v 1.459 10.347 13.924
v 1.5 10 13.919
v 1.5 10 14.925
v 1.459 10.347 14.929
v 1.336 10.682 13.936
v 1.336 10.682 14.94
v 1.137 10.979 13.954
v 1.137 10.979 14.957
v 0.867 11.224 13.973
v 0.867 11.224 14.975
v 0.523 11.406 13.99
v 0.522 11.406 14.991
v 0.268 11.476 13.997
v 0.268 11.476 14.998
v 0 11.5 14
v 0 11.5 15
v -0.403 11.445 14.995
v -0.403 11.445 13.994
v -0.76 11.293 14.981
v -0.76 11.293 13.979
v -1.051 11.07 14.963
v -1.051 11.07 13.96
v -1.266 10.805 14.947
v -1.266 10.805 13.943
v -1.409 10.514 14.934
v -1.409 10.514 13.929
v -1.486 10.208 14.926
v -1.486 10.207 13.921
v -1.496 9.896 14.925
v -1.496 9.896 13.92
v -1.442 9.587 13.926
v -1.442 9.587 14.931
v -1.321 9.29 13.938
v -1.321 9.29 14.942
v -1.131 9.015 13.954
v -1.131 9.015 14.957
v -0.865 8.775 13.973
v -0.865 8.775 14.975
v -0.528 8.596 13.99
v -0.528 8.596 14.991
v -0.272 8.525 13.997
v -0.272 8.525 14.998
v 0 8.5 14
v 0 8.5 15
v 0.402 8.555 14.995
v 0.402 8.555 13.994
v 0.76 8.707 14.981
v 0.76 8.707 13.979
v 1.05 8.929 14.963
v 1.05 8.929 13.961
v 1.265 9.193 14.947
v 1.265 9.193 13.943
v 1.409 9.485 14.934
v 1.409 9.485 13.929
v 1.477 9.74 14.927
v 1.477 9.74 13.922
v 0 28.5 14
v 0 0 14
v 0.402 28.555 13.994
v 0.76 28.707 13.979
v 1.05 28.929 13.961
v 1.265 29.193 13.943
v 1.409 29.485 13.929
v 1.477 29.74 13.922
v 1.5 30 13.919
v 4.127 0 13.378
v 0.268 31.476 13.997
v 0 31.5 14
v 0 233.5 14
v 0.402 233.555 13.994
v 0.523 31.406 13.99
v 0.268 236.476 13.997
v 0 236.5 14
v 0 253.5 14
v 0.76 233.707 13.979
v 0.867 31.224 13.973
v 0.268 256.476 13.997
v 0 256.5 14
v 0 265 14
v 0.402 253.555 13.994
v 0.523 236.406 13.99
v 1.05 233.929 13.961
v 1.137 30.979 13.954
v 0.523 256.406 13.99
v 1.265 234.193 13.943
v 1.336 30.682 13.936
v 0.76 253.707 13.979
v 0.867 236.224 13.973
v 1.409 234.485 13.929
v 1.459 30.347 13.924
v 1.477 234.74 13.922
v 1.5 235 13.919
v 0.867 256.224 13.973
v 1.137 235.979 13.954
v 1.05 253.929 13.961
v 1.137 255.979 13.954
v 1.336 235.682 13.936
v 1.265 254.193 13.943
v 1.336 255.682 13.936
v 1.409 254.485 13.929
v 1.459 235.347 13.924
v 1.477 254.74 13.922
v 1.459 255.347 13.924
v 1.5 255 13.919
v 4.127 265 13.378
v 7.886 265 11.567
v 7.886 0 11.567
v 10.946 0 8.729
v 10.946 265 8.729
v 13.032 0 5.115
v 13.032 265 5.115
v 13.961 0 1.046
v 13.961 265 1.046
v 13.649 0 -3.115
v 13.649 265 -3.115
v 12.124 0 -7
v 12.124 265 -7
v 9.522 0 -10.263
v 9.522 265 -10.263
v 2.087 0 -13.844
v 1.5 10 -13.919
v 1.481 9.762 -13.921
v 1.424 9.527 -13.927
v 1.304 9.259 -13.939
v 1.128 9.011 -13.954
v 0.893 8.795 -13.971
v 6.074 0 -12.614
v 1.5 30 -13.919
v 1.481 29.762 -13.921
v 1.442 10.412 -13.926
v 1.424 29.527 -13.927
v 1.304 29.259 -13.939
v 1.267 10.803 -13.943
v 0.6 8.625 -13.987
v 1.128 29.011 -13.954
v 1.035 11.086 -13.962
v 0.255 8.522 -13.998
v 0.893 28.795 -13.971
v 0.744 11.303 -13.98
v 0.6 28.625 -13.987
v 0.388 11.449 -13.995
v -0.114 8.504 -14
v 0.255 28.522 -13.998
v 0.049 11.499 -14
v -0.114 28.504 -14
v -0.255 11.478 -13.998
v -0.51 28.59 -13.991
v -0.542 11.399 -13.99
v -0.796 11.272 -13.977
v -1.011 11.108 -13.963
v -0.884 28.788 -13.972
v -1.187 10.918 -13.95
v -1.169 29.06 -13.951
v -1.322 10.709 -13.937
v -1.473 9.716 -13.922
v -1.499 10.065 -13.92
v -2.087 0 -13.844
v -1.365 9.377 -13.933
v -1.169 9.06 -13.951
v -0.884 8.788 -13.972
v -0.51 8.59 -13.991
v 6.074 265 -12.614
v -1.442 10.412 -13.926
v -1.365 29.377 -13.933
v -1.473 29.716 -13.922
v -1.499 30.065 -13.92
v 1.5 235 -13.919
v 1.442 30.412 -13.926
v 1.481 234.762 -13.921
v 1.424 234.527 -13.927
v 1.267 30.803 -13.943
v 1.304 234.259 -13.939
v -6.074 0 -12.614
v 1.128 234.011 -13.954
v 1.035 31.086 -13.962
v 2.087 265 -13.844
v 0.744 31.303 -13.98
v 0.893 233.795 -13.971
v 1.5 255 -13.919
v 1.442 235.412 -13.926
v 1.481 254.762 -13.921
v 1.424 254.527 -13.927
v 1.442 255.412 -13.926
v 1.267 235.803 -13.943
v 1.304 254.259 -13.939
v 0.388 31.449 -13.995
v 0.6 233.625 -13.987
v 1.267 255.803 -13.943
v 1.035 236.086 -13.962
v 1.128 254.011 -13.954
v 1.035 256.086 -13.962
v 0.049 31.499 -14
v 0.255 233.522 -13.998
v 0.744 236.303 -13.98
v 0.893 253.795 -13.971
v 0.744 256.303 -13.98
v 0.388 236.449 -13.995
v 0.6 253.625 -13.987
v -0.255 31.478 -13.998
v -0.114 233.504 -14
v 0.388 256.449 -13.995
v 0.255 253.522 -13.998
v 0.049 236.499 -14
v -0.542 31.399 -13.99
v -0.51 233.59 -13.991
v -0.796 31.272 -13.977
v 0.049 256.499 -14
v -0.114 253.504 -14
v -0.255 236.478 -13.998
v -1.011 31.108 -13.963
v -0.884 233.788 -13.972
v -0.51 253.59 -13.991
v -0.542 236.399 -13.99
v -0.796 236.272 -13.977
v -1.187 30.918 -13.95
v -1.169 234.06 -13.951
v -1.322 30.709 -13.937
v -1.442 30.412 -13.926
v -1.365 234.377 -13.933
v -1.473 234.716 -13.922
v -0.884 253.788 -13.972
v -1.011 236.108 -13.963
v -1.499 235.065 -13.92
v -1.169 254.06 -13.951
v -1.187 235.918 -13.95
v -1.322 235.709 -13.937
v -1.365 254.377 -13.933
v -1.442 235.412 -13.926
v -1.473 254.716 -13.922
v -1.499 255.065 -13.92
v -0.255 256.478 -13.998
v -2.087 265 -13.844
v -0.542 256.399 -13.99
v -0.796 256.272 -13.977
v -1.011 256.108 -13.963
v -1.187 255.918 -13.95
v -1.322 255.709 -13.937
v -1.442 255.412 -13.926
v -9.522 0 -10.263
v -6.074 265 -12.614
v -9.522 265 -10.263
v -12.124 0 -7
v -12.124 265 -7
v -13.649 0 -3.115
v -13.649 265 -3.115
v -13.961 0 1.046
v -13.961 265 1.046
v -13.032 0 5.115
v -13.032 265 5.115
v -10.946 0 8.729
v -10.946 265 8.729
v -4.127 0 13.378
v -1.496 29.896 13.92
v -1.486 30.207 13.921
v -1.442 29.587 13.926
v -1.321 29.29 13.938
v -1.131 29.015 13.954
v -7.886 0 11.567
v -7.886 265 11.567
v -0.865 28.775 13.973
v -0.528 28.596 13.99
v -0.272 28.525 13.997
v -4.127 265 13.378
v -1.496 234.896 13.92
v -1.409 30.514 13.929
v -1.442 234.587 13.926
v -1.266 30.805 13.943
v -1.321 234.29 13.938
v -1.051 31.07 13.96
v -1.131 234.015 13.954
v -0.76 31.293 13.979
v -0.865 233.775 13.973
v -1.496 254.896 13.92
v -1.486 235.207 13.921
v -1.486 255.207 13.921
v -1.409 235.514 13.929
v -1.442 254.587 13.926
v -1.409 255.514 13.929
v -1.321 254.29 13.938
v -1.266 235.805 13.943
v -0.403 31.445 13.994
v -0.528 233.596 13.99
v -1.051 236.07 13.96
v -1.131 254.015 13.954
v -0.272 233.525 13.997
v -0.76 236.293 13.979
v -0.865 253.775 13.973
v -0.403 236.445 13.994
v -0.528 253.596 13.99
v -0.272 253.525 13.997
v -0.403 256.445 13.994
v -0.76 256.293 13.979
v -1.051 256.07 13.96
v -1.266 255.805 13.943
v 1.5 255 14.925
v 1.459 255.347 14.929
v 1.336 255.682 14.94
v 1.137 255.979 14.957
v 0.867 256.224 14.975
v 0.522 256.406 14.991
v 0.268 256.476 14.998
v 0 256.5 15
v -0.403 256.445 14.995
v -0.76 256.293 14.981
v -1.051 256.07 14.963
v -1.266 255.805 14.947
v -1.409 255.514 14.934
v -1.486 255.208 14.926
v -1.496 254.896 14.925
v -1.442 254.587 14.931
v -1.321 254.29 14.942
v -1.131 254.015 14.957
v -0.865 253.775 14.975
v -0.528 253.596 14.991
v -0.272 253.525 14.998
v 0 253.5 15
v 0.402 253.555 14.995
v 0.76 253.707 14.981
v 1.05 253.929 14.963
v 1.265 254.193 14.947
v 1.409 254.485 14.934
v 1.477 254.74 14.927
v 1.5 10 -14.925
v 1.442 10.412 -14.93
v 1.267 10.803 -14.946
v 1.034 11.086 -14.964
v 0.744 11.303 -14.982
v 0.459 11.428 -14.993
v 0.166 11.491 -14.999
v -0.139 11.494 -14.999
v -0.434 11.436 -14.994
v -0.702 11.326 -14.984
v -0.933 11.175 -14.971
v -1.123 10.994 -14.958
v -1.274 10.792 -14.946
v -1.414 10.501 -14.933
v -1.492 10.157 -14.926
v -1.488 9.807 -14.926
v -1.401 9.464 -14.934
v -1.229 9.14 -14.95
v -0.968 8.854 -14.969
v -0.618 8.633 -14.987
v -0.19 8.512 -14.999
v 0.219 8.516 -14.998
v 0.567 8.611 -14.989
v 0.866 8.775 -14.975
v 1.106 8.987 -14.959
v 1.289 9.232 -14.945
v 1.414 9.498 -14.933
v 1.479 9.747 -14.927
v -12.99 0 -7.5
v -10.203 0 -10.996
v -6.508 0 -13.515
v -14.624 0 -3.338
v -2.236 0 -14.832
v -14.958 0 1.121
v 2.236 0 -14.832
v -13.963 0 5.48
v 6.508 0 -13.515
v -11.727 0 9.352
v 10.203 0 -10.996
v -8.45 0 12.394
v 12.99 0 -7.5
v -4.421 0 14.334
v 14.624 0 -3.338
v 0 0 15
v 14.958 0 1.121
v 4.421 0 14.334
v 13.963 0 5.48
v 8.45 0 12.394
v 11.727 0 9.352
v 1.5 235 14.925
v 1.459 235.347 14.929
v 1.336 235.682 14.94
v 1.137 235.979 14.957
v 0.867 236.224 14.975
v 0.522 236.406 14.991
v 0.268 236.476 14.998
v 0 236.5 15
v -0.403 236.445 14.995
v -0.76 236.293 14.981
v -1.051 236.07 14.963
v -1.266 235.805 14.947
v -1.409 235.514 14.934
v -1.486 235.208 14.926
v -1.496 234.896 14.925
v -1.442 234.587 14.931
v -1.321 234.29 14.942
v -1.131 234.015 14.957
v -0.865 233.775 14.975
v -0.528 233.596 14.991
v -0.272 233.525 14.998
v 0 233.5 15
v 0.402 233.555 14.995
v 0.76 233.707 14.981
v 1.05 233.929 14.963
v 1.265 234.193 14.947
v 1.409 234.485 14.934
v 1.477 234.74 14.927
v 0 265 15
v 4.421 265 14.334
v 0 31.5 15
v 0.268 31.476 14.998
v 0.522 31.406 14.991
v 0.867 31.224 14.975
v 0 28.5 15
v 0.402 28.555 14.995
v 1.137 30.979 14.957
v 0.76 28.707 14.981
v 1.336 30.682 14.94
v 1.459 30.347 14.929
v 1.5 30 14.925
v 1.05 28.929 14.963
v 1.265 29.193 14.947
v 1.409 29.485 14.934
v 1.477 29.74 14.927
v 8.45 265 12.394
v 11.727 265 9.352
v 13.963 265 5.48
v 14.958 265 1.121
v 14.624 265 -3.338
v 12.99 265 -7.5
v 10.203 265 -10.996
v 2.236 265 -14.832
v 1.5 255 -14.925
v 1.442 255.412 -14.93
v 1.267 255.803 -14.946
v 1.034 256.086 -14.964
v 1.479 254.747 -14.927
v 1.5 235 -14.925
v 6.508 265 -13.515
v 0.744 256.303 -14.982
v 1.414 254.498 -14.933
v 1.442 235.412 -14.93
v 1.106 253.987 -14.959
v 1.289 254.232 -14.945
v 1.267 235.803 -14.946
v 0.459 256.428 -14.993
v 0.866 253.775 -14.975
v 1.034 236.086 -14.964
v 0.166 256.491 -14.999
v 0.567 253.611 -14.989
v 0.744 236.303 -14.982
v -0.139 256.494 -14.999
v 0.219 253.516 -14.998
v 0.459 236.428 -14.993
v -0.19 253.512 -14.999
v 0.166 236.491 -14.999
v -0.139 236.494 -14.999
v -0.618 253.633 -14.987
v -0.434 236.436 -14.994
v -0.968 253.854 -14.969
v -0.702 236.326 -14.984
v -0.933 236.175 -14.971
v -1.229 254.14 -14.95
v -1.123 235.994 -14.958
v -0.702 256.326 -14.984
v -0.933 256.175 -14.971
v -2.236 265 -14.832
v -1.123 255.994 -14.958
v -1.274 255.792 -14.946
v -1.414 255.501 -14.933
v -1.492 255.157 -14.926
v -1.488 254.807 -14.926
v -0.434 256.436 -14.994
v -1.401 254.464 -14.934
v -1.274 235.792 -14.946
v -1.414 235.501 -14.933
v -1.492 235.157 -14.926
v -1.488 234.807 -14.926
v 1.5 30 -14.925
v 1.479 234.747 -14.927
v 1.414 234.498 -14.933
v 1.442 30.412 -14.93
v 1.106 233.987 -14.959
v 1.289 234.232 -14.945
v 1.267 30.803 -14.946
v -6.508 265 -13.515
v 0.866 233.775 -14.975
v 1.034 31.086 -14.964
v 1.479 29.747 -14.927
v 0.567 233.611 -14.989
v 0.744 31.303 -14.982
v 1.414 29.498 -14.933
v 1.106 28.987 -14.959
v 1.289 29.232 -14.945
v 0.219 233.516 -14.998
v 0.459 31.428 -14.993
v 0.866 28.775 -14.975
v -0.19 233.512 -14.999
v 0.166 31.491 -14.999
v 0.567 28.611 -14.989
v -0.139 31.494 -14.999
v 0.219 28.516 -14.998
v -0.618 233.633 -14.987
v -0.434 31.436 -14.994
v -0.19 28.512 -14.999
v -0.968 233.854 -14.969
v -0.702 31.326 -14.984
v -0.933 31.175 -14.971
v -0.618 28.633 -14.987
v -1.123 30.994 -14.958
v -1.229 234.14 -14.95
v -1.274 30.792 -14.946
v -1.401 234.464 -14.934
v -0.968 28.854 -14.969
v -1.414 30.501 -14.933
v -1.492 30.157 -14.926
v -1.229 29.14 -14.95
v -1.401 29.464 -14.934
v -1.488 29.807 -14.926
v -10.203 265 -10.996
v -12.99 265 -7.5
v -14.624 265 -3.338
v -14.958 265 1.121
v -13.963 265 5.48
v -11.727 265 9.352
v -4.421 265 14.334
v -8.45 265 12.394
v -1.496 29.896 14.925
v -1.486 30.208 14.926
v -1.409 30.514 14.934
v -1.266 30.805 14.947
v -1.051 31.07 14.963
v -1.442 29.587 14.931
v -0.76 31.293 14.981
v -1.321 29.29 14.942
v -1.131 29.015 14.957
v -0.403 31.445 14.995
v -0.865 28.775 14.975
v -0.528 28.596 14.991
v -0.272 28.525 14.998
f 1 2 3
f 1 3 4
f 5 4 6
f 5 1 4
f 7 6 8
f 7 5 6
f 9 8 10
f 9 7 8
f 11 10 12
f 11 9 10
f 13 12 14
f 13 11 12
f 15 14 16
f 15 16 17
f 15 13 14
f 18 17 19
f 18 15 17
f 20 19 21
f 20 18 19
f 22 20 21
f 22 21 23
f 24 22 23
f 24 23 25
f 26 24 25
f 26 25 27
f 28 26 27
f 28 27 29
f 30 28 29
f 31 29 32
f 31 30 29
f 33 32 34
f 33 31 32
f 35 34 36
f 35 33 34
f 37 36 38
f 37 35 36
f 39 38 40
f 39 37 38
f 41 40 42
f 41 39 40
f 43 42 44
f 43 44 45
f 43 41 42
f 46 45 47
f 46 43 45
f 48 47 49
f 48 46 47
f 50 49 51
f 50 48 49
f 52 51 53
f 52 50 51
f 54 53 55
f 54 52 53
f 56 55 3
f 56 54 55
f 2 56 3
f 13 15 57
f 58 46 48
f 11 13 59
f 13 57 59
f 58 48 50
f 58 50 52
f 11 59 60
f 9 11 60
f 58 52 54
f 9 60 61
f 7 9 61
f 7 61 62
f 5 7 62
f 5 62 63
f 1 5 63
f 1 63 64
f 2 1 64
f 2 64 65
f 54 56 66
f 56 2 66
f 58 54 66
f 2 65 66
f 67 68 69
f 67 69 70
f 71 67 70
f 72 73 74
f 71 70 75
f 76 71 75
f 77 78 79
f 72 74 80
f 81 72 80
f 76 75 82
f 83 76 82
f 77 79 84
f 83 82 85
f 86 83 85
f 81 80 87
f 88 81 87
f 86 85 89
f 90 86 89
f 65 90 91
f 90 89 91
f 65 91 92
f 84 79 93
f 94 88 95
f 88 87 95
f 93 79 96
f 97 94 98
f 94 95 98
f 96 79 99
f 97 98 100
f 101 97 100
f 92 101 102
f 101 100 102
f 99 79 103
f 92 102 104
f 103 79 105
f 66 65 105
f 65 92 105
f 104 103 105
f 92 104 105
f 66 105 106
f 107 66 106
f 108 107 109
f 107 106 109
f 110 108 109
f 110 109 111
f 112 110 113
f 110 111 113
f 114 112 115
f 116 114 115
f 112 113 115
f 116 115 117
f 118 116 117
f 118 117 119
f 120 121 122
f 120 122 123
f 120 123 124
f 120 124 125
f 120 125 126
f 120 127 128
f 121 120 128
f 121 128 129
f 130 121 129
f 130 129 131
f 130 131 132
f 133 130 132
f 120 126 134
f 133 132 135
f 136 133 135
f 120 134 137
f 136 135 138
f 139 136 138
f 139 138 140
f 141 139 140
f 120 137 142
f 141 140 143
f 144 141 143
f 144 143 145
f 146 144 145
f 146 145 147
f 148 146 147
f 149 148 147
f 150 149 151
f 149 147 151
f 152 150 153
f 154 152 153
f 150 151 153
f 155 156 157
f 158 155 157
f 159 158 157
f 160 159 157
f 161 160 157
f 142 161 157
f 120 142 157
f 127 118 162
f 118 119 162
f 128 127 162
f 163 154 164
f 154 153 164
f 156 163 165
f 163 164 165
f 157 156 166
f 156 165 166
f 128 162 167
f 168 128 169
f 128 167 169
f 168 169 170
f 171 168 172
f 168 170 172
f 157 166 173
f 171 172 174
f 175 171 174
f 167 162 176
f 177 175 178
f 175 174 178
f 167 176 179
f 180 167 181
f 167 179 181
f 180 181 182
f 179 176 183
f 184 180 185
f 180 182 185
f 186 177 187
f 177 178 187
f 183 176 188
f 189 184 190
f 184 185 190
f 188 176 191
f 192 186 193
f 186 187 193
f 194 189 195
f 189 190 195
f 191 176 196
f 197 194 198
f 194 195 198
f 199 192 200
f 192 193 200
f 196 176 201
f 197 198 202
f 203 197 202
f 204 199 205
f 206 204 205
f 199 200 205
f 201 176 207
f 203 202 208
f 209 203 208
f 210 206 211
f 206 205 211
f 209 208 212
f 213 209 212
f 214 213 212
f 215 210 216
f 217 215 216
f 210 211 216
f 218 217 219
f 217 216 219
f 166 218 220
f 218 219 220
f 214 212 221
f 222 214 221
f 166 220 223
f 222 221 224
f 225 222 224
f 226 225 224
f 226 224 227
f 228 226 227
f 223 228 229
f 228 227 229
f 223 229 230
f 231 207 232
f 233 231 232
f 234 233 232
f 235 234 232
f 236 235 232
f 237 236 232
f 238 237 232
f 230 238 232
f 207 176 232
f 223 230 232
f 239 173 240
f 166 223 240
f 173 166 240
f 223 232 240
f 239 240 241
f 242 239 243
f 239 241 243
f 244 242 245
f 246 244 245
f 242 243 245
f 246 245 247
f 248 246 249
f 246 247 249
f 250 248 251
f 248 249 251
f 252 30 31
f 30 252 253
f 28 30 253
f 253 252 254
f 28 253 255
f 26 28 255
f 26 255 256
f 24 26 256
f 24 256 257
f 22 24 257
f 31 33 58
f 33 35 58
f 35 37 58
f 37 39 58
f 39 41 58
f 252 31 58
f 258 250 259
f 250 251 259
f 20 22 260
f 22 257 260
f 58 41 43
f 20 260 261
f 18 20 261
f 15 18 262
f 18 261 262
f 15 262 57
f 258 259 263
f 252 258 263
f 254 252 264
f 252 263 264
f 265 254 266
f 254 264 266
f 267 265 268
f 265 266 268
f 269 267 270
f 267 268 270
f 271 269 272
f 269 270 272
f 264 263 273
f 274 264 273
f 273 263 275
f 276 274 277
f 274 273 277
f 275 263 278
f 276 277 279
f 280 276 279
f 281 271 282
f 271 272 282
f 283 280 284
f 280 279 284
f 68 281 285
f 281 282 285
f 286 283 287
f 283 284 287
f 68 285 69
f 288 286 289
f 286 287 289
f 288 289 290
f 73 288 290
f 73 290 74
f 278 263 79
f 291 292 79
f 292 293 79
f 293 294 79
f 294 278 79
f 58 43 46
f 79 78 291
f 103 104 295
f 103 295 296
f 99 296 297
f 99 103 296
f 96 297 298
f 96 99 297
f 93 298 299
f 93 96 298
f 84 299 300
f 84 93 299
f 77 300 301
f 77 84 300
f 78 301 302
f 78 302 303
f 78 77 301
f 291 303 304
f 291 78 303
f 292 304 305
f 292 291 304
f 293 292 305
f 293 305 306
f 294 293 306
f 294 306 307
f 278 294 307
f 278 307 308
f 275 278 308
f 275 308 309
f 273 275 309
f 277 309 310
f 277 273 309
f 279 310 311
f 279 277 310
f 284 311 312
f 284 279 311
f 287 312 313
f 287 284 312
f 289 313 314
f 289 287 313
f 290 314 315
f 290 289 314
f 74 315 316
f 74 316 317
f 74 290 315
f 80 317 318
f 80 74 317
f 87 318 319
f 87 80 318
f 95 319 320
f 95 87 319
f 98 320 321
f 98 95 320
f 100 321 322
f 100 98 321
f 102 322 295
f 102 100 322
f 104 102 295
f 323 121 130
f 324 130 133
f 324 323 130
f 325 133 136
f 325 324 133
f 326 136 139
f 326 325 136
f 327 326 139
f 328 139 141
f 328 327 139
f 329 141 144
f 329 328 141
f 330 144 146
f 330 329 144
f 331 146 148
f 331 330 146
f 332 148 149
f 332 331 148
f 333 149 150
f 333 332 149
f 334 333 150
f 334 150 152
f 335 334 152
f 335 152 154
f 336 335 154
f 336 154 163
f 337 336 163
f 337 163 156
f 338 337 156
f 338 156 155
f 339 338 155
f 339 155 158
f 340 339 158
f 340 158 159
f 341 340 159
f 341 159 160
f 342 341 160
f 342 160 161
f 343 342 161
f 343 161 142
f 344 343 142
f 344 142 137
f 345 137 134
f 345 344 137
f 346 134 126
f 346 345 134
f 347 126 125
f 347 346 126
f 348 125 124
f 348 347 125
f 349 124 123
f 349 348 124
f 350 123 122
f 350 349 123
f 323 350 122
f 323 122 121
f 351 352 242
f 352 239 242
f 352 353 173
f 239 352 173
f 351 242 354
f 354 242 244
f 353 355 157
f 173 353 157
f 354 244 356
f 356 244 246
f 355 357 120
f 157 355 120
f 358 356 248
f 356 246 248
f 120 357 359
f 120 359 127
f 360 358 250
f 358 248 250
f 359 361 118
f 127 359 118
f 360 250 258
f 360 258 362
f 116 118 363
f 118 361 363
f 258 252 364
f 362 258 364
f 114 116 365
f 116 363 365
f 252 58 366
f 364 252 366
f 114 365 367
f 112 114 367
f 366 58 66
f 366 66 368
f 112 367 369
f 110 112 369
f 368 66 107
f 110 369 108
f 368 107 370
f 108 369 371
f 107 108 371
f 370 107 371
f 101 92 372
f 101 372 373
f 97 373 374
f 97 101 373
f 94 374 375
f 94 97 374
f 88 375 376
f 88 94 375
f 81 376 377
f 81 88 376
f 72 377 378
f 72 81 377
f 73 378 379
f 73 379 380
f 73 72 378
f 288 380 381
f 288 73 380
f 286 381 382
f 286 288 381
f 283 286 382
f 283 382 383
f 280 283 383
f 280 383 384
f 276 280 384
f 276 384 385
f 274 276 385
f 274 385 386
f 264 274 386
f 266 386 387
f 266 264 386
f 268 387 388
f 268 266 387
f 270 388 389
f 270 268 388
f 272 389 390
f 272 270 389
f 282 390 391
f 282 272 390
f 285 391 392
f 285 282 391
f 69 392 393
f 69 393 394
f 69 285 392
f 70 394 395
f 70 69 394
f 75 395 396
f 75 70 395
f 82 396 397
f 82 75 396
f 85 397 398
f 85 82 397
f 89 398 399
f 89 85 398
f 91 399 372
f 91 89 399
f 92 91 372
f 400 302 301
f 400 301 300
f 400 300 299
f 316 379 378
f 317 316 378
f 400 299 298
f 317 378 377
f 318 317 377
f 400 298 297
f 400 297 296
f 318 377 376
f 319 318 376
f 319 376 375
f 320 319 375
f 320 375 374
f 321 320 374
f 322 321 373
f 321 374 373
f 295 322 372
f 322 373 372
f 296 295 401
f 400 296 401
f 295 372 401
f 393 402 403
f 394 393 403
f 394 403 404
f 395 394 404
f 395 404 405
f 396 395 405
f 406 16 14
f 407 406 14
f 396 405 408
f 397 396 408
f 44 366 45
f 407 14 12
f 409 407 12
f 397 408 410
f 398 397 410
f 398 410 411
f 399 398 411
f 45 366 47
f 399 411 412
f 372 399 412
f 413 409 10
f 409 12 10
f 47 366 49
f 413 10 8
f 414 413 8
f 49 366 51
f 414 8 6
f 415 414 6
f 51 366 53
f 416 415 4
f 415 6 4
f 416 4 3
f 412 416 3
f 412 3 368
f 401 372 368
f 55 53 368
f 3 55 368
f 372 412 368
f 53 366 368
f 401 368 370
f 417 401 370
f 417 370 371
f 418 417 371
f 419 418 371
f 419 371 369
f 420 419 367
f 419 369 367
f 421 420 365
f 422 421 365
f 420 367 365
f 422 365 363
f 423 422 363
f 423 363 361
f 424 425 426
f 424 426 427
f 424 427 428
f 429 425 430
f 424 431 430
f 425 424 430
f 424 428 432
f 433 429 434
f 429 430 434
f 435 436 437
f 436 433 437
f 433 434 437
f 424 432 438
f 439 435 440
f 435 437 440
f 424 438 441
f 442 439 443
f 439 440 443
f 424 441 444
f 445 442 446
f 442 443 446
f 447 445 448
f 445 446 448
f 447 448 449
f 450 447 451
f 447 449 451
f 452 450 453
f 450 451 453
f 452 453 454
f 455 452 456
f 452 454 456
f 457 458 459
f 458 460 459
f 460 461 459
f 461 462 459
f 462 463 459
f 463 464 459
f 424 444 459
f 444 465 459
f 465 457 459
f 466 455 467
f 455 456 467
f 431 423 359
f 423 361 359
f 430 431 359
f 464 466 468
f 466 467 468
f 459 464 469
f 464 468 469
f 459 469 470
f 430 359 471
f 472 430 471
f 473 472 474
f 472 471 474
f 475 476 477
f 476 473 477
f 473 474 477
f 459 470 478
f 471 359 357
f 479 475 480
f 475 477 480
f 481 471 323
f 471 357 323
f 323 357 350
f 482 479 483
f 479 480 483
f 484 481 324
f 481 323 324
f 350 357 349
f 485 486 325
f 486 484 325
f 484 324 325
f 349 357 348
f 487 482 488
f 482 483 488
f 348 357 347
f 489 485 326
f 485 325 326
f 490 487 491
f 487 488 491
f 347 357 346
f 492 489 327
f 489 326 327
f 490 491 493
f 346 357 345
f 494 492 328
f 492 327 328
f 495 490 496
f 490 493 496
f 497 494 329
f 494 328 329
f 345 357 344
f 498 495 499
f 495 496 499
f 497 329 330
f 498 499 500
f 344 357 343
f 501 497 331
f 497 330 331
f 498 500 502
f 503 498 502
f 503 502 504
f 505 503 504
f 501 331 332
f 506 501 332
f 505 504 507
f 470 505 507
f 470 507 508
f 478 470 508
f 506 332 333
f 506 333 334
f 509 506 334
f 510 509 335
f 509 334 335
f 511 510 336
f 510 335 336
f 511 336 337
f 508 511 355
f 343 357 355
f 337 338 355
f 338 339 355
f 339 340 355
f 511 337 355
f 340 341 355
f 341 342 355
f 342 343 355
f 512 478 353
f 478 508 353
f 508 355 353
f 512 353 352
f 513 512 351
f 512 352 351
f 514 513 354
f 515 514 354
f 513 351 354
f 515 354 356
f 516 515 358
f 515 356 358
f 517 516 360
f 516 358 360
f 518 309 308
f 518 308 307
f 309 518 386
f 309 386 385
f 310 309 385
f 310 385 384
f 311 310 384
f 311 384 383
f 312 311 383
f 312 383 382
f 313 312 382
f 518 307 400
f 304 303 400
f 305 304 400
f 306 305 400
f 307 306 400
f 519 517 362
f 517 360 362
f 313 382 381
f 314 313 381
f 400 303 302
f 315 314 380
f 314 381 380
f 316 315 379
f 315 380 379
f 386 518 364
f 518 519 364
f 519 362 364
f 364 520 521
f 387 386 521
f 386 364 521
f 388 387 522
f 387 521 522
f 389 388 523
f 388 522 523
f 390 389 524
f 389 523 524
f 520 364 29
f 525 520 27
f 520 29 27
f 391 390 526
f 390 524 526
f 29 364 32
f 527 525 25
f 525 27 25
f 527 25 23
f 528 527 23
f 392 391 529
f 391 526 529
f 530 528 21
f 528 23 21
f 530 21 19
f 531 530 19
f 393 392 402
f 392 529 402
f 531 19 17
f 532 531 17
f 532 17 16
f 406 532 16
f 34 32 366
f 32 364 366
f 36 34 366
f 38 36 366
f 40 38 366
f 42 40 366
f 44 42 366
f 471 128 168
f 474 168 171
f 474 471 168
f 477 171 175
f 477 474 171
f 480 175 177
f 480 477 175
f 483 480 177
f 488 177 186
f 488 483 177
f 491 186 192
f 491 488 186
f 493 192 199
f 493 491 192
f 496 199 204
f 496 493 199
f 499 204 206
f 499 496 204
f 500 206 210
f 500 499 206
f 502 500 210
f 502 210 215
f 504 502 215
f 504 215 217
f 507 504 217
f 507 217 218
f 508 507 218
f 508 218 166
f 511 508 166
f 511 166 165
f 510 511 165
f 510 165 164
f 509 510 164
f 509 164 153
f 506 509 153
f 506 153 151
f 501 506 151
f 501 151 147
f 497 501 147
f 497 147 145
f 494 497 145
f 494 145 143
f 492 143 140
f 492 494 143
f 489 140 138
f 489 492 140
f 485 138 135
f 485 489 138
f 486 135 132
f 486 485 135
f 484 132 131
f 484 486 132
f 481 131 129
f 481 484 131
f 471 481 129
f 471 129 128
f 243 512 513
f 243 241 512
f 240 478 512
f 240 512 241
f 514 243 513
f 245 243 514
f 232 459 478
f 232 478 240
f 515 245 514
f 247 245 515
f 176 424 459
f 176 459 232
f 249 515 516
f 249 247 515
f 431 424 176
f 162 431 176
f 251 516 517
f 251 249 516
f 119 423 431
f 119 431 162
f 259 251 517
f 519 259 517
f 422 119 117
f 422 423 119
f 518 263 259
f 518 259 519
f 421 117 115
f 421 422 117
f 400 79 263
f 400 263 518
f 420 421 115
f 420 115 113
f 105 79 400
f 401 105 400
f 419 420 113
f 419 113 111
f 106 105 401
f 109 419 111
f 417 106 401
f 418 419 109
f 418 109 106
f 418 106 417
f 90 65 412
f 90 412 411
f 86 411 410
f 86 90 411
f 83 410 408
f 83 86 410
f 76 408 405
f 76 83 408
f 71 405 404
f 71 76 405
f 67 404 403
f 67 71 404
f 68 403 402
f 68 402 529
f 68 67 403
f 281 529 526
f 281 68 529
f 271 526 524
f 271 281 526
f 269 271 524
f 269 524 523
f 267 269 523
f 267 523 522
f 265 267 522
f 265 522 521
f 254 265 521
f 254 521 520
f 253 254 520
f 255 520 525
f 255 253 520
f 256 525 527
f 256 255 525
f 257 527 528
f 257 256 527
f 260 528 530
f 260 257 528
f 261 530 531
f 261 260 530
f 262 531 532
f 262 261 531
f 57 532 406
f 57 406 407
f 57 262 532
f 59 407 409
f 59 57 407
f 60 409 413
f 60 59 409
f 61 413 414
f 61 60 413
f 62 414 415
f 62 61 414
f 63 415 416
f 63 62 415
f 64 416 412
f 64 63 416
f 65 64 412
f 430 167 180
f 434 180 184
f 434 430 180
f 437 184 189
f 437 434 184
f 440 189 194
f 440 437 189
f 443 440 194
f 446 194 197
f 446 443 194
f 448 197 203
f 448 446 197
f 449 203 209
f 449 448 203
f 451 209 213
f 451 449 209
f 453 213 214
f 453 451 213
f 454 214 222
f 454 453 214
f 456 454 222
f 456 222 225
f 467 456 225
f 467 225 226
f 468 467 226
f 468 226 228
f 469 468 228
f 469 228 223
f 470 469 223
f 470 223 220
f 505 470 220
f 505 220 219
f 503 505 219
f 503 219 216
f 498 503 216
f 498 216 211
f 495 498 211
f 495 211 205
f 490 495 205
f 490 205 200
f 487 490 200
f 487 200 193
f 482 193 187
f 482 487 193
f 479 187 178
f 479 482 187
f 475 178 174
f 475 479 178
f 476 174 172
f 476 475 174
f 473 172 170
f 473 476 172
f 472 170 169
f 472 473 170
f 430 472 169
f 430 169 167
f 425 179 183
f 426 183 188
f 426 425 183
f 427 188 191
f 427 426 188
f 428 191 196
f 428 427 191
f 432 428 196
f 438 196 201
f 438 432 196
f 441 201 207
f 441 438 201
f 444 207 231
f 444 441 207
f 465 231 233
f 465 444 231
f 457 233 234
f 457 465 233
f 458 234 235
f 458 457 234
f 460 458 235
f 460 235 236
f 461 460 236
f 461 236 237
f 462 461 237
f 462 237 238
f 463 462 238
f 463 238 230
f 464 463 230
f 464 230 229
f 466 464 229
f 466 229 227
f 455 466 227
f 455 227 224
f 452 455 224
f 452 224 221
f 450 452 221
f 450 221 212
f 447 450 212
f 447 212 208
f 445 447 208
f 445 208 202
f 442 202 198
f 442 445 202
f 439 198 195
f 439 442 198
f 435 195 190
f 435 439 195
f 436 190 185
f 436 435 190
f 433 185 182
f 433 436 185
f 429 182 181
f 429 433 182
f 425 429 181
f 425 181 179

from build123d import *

# Parameters (mm, degrees)
SKETCH_1_R               = 15
EXTRUDE_1_DEPTH          = 265
CUT_EXTRUDE_1_DEPTH      = 266.847700761
CUT_EXTRUDE_1_DEPTH_BACK = 266.847700761
SKETCH_2_R               = 1.5
CUT_EXTRUDE_2_REACH      = 267.848
SKETCH_3_R               = 14


with BuildPart() as part:
    # 草圖1 → 填料-伸長1 (new body)
    with BuildSketch(Plane(origin=(0, 0, 0), x_dir=(1, 0, 0), z_dir=(0, 1, 0))):
        with Locations(Location((0, 0, 0), (0, 0, 270))):
            Circle(SKETCH_1_R)
    extrude(amount=EXTRUDE_1_DEPTH)

    # 草圖2 → 除料-伸長1 (cut, two sides: drawn at the far end of the back side and taken through both)
    with BuildSketch(Plane.XY.offset(-CUT_EXTRUDE_1_DEPTH_BACK)):
        with Locations((0, 255)):
            Circle(SKETCH_2_R)
        with Locations((0, 235)):
            Circle(SKETCH_2_R)
        with Locations((0, 10)):
            Circle(SKETCH_2_R)
        with Locations((0, 30)):
            Circle(SKETCH_2_R)
    extrude(amount=CUT_EXTRUDE_1_DEPTH + CUT_EXTRUDE_1_DEPTH_BACK, mode=Mode.SUBTRACT)

    # 草圖3 → 除料-伸長2 (cut, up to next)
    with BuildSketch(Plane(origin=(0, 265, 0), x_dir=(1, 0, 0), z_dir=(0, 1, 0)), mode=Mode.PRIVATE) as cut_extrude_2_sk1:
        with Locations(Location((0, 0, 0), (0, 0, 270))):
            Circle(SKETCH_3_R)
    cut_extrude_2_tool1 = extrude(cut_extrude_2_sk1.sketch, amount=-CUT_EXTRUDE_2_REACH, mode=Mode.PRIVATE) & part.part
    add(cut_extrude_2_tool1.solids().sort_by_distance((0, 265, 0))[0], mode=Mode.SUBTRACT)


solid = part.part
